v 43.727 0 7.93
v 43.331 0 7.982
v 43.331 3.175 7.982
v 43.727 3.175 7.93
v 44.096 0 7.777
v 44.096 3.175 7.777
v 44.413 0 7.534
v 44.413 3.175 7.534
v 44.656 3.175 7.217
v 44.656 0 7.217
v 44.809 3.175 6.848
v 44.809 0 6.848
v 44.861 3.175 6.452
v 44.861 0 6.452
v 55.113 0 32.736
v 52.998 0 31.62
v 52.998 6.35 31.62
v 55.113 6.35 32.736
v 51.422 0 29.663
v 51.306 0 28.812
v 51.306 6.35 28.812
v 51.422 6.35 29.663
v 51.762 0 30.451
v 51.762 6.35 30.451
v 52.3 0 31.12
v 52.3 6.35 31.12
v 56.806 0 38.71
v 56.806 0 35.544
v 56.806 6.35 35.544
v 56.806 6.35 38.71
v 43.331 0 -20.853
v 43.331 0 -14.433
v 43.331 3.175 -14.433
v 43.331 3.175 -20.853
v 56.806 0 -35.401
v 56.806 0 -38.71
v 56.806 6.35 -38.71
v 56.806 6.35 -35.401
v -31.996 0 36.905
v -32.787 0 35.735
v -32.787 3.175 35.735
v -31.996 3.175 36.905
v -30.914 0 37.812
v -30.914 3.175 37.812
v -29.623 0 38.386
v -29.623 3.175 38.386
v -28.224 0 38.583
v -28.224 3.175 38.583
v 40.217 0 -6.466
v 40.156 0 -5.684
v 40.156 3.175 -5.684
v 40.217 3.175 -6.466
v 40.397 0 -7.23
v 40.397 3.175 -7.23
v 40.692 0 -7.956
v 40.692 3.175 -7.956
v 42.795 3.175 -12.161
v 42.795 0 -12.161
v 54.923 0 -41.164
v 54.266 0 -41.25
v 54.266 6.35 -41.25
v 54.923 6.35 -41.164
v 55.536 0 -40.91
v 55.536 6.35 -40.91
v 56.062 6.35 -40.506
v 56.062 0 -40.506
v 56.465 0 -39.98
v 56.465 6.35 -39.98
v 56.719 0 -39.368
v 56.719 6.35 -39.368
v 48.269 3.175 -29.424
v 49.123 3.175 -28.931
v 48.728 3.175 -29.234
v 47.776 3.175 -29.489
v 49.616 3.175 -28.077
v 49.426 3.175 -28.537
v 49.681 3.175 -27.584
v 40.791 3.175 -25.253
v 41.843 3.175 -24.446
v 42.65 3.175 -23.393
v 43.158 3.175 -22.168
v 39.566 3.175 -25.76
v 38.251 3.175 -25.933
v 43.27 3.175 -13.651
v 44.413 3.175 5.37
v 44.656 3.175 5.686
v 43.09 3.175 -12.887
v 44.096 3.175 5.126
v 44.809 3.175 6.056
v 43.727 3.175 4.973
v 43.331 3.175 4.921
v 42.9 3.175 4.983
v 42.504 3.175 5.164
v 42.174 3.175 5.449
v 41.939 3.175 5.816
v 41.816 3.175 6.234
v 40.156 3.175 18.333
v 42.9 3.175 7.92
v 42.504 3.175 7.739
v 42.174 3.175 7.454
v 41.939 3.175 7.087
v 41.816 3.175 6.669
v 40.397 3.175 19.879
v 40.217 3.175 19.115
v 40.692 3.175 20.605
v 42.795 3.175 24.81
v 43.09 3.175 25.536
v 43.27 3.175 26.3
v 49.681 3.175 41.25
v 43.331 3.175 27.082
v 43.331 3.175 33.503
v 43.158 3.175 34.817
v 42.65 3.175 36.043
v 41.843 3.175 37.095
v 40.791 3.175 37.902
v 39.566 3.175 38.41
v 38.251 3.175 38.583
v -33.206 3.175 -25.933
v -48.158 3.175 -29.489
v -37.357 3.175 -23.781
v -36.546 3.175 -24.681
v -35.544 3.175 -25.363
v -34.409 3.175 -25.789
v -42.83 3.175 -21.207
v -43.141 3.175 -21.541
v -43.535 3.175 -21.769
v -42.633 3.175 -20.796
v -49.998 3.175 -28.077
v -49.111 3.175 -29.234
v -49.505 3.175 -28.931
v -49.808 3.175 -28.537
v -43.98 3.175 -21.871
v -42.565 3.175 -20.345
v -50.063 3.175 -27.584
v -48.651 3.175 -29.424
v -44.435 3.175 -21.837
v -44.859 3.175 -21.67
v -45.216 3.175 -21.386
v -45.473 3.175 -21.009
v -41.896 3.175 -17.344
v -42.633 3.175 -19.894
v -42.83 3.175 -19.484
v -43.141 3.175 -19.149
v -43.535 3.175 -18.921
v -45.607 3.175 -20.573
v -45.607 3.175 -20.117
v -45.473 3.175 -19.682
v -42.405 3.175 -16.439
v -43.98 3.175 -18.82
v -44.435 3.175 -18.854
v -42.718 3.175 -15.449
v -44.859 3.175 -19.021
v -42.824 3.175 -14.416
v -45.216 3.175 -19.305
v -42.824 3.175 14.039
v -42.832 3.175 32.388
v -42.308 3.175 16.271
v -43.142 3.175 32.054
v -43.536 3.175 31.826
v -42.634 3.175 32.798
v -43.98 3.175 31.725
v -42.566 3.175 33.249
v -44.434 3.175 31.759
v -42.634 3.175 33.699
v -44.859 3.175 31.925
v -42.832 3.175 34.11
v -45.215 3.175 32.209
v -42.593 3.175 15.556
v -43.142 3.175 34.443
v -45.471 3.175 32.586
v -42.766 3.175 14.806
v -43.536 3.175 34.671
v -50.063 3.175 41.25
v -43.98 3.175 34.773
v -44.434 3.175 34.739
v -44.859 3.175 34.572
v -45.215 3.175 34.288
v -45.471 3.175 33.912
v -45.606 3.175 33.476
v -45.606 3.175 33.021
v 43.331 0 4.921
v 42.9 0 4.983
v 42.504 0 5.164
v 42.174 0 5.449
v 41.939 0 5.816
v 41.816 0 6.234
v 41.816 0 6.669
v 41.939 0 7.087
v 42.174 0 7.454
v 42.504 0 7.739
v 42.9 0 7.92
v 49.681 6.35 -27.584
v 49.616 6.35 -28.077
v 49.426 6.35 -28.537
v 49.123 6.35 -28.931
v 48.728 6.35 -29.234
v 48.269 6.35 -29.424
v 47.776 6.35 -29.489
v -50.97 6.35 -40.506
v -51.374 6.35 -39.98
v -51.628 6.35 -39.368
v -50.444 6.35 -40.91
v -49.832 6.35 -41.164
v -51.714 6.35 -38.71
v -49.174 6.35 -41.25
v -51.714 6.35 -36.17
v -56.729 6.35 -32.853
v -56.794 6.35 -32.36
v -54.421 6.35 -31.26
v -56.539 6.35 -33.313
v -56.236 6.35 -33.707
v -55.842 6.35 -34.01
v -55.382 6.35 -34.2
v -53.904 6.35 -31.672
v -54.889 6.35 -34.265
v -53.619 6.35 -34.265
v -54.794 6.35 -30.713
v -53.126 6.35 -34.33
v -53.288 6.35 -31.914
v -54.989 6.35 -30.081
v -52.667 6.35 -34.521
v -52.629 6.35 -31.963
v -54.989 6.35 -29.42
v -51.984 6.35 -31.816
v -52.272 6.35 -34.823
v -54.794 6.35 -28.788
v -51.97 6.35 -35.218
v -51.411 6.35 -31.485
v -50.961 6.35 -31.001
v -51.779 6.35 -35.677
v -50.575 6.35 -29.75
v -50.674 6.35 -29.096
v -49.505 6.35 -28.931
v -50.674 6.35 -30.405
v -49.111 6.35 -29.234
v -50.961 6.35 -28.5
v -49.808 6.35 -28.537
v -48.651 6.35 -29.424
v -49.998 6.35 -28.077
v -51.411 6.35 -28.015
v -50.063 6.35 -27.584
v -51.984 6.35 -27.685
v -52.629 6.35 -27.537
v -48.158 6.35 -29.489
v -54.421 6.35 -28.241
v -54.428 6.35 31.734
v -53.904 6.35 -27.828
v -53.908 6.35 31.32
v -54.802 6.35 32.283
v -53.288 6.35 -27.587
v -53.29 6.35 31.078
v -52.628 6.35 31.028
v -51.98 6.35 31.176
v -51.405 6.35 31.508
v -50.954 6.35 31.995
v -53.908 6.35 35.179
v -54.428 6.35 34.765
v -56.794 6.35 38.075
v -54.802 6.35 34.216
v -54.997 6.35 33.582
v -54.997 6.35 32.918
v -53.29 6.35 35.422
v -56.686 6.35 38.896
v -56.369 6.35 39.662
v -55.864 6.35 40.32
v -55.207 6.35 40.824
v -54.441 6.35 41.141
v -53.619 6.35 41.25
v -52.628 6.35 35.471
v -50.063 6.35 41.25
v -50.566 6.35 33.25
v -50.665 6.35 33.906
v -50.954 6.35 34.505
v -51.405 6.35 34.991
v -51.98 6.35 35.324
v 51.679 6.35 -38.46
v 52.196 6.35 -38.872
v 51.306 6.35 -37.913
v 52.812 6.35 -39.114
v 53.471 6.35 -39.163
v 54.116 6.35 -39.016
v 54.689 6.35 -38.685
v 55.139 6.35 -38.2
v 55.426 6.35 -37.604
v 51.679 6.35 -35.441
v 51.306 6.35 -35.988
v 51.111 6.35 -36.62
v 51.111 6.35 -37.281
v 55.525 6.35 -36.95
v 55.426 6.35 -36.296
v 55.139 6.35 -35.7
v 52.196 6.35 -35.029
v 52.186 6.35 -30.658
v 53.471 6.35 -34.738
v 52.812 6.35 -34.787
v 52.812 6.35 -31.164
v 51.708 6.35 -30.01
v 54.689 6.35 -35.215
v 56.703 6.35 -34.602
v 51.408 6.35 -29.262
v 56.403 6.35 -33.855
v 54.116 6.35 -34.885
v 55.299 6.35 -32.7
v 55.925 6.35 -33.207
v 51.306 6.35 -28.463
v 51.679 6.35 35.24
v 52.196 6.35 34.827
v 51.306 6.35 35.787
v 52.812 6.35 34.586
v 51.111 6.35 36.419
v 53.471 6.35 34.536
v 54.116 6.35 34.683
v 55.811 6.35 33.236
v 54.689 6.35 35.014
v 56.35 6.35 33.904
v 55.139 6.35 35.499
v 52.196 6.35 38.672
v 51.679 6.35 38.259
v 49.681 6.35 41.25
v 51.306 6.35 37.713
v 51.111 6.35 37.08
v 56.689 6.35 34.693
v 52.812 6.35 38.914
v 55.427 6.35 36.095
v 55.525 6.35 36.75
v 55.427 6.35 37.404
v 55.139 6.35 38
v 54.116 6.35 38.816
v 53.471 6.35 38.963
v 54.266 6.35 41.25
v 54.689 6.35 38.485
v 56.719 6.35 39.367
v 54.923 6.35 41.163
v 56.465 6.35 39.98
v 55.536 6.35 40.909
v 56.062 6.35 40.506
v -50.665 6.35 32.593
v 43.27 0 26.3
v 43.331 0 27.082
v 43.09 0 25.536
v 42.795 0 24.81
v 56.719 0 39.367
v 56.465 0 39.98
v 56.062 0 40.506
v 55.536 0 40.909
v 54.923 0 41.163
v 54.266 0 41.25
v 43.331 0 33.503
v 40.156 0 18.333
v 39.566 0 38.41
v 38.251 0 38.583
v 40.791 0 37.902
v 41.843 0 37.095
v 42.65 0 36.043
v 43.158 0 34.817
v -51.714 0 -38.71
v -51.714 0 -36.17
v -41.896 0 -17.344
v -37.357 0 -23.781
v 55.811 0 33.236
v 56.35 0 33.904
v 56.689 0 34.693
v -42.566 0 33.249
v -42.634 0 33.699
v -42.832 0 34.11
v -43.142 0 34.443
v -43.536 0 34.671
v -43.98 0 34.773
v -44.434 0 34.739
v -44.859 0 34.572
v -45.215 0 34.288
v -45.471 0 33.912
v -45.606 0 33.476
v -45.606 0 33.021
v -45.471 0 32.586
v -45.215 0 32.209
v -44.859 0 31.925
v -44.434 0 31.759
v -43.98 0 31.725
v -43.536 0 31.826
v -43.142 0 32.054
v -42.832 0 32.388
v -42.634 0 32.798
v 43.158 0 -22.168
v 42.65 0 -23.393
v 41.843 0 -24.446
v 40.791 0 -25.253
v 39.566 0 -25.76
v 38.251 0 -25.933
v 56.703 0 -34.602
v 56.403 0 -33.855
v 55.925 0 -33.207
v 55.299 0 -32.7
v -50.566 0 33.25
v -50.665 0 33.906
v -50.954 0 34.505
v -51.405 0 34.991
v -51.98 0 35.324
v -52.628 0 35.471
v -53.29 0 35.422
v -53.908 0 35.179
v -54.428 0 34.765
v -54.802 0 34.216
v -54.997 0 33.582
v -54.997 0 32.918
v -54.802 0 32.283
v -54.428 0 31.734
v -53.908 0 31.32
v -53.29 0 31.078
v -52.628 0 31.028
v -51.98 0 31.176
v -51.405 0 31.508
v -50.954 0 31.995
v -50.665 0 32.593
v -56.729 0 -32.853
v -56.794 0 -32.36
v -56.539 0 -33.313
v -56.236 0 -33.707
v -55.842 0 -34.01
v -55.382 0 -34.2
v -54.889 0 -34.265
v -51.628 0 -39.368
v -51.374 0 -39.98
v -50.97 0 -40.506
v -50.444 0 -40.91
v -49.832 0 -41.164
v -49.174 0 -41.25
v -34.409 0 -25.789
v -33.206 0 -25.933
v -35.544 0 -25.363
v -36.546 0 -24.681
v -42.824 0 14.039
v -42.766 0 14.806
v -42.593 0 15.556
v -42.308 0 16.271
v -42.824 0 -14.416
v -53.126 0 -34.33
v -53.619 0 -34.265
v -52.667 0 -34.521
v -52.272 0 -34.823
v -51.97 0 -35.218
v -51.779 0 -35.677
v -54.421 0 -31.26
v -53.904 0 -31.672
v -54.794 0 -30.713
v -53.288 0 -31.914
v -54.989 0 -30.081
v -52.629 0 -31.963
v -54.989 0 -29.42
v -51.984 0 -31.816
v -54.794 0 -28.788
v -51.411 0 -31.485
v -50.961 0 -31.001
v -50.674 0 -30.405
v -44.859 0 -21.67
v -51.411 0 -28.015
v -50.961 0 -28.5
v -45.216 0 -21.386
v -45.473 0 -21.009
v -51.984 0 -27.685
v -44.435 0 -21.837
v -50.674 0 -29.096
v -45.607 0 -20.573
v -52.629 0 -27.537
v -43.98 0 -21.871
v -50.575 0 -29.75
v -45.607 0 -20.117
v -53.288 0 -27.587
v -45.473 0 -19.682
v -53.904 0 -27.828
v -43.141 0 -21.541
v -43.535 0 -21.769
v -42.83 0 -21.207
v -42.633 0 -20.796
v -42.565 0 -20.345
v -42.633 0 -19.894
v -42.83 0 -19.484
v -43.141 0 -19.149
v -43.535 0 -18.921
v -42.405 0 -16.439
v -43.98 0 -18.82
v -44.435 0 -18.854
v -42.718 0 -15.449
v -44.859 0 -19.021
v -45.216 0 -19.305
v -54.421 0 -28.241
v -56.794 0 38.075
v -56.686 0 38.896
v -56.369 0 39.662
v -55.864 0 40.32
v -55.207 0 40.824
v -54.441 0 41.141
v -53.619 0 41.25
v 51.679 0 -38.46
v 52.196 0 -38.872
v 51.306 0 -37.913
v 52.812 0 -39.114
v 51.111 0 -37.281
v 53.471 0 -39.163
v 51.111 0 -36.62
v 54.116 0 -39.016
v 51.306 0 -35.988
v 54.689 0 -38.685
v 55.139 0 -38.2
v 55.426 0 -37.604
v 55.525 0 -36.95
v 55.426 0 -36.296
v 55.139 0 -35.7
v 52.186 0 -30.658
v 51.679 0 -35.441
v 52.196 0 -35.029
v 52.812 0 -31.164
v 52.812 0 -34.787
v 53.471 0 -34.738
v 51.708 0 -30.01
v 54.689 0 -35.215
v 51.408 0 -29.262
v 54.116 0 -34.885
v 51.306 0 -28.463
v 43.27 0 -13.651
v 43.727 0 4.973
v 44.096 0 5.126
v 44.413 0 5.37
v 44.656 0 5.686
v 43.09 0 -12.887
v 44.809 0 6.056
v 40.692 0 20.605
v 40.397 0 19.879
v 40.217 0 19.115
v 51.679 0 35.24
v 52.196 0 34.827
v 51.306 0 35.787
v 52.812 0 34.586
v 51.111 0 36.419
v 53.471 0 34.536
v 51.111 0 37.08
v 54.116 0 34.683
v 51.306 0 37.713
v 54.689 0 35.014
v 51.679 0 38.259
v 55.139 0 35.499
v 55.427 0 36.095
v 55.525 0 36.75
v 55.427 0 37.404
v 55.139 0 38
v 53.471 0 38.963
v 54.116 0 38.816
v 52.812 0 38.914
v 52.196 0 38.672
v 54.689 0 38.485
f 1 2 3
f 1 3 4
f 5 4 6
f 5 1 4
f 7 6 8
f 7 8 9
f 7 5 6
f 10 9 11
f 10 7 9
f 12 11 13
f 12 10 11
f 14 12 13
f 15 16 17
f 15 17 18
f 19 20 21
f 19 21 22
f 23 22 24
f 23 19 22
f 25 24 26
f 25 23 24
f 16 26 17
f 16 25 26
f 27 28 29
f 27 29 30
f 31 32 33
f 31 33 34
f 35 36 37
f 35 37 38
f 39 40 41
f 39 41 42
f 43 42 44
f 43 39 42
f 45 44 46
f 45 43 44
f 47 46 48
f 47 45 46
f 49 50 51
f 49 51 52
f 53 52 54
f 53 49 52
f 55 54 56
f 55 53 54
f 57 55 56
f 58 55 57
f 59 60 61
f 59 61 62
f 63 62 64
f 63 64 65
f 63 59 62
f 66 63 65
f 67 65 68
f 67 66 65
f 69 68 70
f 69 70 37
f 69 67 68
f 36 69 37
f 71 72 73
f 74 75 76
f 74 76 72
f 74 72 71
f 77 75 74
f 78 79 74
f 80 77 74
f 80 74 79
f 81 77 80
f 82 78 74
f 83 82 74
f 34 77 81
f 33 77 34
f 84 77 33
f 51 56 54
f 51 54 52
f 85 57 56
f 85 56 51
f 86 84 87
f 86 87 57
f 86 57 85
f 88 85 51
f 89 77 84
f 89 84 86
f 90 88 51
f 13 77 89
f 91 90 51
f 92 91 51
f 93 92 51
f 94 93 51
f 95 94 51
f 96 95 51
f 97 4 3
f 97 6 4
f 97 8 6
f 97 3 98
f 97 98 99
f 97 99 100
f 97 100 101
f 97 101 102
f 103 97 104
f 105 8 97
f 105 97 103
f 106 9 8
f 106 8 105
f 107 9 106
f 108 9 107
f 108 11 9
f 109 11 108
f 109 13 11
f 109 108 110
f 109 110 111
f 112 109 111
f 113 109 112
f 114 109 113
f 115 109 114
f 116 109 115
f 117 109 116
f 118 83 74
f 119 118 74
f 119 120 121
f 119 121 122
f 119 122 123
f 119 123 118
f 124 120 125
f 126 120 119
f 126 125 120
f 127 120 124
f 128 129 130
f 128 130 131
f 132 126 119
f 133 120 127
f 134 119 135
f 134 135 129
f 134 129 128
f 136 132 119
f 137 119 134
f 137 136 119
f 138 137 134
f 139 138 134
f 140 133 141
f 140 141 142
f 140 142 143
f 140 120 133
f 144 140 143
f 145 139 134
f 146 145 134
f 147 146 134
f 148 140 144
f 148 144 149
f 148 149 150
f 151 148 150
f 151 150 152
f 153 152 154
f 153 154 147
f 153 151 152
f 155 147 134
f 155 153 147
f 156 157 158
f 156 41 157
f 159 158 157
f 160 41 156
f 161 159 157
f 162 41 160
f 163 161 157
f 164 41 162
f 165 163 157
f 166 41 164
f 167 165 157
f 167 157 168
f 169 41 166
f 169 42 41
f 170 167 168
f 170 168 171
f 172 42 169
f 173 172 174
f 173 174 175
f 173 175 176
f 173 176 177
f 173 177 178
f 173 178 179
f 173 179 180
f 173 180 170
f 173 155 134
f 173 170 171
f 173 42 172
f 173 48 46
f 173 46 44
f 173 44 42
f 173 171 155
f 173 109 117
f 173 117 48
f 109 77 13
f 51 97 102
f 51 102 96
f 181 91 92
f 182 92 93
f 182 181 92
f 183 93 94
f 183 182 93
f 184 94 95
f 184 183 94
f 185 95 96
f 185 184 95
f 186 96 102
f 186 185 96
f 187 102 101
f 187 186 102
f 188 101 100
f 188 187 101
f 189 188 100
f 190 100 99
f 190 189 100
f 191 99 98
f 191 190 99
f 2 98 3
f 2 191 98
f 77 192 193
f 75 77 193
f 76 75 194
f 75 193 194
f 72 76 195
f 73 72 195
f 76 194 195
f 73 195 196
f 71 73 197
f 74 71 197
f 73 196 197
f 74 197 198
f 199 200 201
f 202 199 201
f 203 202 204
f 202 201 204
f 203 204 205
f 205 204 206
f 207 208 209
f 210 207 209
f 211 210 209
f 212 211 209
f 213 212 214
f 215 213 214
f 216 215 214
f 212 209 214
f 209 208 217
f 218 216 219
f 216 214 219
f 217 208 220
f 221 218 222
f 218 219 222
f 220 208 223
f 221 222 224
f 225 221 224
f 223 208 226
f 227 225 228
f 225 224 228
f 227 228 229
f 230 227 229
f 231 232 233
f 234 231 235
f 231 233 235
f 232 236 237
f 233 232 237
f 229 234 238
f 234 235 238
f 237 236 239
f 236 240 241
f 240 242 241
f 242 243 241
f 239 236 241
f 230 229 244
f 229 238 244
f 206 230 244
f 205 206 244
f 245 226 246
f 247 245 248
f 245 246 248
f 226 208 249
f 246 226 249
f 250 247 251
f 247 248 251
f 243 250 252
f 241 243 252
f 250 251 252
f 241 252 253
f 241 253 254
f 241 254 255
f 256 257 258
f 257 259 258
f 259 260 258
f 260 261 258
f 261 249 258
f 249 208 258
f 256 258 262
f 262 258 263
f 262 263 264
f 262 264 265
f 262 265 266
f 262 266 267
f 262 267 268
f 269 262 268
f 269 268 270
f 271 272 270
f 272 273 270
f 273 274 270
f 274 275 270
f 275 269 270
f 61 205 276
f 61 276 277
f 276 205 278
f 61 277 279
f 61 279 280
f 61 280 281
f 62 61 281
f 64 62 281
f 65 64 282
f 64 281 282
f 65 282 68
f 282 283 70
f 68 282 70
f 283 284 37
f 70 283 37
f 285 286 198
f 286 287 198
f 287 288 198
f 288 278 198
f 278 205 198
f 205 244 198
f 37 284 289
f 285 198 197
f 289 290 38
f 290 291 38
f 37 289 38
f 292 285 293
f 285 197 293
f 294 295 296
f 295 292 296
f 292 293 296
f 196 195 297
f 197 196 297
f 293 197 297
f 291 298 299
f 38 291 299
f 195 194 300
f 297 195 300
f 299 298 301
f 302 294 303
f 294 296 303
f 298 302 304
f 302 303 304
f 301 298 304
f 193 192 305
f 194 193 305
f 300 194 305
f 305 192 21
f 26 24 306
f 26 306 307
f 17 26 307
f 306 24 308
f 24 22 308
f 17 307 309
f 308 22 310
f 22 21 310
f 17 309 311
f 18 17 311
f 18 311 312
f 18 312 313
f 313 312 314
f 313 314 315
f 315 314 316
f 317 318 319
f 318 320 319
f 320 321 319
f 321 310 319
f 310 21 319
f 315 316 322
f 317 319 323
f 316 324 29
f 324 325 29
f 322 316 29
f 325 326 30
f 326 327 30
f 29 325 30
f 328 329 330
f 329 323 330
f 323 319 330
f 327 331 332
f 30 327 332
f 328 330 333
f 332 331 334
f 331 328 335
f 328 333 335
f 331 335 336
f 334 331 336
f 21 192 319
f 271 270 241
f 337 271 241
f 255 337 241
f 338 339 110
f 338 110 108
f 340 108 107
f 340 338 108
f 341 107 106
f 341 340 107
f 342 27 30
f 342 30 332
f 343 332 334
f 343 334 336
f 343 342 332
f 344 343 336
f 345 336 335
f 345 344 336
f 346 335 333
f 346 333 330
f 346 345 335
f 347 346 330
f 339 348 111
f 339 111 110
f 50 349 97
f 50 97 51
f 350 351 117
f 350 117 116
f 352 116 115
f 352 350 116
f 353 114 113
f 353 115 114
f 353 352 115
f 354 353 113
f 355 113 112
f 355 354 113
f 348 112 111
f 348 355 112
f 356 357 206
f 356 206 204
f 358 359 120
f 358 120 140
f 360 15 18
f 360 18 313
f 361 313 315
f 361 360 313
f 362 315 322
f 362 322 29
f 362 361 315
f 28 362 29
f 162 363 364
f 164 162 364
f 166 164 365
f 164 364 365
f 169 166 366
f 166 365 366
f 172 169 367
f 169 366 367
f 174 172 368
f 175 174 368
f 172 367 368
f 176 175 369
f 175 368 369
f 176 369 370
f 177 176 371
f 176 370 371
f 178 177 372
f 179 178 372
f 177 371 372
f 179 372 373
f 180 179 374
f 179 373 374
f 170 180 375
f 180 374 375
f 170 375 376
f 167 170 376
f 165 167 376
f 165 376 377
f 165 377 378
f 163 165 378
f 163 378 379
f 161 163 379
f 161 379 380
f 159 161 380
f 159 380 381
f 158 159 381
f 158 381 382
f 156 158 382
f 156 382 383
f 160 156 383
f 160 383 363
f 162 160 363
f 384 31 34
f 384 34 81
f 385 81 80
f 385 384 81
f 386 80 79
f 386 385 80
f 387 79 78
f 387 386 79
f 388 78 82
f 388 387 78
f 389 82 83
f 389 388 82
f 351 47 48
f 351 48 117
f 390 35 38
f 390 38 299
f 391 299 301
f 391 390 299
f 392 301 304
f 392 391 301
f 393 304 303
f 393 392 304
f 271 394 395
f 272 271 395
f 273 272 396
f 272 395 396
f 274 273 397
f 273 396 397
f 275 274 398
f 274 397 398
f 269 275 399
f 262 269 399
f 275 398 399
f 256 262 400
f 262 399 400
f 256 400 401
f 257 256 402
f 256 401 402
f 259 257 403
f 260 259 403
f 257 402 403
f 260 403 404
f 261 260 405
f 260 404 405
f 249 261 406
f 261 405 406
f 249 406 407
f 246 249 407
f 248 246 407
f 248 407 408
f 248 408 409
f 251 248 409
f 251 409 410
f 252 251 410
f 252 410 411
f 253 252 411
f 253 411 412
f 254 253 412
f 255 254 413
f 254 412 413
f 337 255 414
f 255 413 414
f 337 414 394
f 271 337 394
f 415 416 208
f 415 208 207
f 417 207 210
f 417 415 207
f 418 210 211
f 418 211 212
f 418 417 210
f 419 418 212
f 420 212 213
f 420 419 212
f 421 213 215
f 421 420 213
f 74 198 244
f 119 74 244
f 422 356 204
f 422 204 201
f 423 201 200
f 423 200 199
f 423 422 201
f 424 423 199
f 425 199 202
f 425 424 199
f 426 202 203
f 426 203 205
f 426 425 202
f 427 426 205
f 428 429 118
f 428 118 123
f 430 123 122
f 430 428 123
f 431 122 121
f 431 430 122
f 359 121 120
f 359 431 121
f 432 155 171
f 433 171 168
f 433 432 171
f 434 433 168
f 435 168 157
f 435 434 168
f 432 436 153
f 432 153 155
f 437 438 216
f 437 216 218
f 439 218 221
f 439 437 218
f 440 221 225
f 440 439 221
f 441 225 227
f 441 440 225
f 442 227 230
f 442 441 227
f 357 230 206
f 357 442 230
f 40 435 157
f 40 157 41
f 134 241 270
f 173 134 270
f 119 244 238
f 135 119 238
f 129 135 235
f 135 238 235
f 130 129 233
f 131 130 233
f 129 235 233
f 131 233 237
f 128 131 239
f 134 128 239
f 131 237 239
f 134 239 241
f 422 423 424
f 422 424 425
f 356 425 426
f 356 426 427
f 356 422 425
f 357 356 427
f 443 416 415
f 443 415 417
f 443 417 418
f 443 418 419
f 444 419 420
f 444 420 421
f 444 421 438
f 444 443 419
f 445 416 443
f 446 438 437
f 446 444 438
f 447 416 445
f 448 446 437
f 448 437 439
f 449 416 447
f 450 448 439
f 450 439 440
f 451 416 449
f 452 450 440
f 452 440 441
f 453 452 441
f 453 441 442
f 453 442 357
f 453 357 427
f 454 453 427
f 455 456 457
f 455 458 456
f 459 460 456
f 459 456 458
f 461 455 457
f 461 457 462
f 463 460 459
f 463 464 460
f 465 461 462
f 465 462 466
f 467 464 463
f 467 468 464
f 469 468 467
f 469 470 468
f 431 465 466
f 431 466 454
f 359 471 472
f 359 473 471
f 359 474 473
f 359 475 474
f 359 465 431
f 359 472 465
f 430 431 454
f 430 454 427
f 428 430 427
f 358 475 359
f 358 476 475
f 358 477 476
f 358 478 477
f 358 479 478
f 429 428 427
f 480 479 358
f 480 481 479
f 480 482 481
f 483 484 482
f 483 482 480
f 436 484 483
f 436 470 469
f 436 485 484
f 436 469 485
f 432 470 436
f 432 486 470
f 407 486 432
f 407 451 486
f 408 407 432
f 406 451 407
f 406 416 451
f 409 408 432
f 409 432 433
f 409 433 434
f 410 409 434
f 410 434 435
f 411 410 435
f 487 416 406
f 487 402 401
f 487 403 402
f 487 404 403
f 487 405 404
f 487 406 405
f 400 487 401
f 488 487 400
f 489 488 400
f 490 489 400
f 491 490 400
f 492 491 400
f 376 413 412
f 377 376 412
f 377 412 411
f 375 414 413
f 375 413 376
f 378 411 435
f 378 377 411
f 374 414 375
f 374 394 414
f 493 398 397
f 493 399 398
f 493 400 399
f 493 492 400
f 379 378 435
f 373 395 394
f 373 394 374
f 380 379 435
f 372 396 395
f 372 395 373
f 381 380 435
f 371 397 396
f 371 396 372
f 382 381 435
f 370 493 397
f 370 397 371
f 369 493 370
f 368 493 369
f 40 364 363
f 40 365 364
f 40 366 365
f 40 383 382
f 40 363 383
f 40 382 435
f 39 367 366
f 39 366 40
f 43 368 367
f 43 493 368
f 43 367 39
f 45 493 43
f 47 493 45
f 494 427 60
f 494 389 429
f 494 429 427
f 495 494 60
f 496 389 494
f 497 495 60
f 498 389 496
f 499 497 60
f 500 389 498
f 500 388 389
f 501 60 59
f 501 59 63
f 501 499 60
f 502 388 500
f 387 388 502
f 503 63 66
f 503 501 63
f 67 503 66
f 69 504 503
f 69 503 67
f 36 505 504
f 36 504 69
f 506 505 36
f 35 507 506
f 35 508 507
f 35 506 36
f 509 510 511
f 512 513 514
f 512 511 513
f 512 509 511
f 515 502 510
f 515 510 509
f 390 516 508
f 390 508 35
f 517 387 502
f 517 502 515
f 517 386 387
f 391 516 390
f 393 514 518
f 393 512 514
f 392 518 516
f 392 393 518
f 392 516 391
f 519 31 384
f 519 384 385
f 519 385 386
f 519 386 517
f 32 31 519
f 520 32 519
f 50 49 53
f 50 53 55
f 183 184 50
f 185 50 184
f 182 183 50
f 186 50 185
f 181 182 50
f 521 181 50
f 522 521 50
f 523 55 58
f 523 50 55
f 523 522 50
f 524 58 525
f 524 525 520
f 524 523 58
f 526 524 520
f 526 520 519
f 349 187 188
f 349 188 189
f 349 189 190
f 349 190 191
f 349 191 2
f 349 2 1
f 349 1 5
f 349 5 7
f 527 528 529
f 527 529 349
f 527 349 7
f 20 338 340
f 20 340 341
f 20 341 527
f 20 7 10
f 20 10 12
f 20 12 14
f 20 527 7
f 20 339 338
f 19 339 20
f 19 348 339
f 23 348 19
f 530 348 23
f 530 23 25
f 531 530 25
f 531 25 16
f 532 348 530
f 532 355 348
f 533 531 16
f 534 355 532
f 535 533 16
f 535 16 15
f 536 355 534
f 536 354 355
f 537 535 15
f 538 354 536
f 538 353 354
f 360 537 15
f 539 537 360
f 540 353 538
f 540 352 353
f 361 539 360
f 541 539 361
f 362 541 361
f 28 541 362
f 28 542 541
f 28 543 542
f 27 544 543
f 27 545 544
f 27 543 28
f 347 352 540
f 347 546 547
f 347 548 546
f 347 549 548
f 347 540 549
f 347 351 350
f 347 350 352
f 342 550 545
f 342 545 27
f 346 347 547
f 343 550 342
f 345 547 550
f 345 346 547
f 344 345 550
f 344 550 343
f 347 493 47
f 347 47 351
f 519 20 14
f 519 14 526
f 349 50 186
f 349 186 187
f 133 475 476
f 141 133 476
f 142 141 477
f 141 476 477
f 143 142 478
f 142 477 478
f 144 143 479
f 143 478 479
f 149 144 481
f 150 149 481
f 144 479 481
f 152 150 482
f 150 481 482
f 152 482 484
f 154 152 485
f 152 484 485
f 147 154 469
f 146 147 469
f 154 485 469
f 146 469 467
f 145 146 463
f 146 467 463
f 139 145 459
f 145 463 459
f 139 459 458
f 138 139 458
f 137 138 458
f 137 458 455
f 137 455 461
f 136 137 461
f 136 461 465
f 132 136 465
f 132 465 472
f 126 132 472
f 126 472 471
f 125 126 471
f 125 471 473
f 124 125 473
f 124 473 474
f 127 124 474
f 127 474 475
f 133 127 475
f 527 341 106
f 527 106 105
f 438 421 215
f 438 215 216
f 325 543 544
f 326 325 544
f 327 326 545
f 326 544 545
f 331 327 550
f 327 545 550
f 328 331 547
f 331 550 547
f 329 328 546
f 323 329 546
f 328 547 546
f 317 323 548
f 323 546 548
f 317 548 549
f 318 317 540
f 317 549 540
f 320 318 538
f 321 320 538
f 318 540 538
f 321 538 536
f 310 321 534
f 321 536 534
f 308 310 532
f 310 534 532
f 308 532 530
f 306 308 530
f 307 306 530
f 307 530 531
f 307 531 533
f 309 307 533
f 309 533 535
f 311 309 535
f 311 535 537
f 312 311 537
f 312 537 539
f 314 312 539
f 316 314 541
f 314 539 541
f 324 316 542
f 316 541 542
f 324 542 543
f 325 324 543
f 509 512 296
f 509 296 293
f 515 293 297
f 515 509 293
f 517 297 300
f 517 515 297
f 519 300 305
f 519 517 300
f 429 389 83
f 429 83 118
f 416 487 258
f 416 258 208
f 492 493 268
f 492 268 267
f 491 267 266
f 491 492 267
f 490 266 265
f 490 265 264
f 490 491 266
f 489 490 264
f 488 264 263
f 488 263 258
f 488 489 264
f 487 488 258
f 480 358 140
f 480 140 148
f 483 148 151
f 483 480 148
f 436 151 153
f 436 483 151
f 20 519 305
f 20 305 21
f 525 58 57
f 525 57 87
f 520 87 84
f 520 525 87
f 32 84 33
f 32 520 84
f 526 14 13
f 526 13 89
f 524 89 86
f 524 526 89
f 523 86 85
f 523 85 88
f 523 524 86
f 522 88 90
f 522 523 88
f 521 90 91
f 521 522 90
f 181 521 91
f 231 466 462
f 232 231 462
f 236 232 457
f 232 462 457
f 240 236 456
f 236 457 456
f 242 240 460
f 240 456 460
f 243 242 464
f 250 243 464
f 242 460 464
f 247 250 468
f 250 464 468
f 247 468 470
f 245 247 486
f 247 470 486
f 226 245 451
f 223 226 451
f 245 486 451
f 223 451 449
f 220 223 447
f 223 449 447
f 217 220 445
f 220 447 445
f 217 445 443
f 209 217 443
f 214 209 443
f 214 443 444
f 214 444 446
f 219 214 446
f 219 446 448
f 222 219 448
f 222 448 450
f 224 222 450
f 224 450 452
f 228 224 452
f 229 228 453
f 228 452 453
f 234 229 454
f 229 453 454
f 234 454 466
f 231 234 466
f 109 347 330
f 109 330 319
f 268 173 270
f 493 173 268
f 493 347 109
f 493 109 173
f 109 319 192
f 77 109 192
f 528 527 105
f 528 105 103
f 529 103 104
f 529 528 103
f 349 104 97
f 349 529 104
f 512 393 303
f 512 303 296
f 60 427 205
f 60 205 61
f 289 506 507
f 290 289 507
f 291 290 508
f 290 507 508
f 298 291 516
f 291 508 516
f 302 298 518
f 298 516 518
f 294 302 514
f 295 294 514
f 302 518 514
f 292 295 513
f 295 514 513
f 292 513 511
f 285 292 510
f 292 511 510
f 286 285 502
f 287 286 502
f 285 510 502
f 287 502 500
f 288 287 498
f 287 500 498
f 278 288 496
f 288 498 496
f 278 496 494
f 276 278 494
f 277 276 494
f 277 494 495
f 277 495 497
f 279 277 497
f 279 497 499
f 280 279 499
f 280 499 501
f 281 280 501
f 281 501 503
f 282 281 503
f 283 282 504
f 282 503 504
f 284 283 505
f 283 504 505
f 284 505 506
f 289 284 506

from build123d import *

# Parameters (mm, degrees)
F0_R     = 2.219223
F0_R_2   = 1.529807
F0_R_3   = 2.219078
F0_R_4   = 2.227919
F0_R_5   = 1.528278
F0_R_6   = 2.219557
F1_DEPTH = 6.35
F2_R     = 1.529807
F2_R_2   = 1.530286
F2_R_3   = 1.528278
F3_DEPTH = 3.175


with BuildPart() as f1:
    # F0 (on Front) → F1 (new body)
    with BuildSketch(Plane.XZ):
        with BuildLine():
            Line((54.2656, 41.2496), (-53.6194, 41.2496))
            ThreePointArc((-53.6194, 41.2496), (-55.864464, 40.319664), (-56.7944, 38.0746))
            Line((-56.7944, 38.0746), (-56.7944, -32.3604))
            ThreePointArc((-56.7944, -32.3604), (-56.236438, -33.707438), (-54.8894, -34.2654))
            Line((-54.8894, -34.2654), (-53.6194, -34.2654))
            ThreePointArc((-53.6194, -34.2654), (-52.272362, -34.823362), (-51.7144, -36.1704))
            Line((-51.7144, -36.1704), (-51.7144, -38.7104))
            ThreePointArc((-51.7144, -38.7104), (-50.970451, -40.506451), (-49.1744, -41.2504))
            Line((-49.1744, -41.2504), (54.2656, -41.2504))
            ThreePointArc((54.2656, -41.2504), (56.061651, -40.506451), (56.8056, -38.7104))
            Line((56.8056, -38.7104), (56.8056, -35.401342))
            ThreePointArc((56.8056, -35.401342), (56.40343, -33.854721), (55.298806, -32.699913))
            Line((55.298806, -32.699913), (52.812394, -31.164487))
            ThreePointArc((52.812394, -31.164487), (51.70777, -30.009679), (51.3056, -28.463058))
            Line((51.3056, -28.463058), (51.3056, 28.811881))
            ThreePointArc((51.3056, 28.811881), (51.761511, 30.451144), (52.998313, 31.619629))
            Line((52.998313, 31.619629), (55.112887, 32.735971))
            ThreePointArc((55.112887, 32.735971), (56.349689, 33.904456), (56.8056, 35.543719))
            Line((56.8056, 35.543719), (56.8056, 38.7096))
            ThreePointArc((56.8056, 38.7096), (56.061651, 40.505651), (54.2656, 41.2496))
        make_face()
        with Locations((-52.7944, -29.7504)):
            Circle(F0_R, mode=Mode.SUBTRACT)
        with Locations((-44.0944, -20.3454)):
            Circle(F0_R_2, mode=Mode.SUBTRACT)
        with Locations((53.3056, -36.9504)):
            Circle(F0_R_3, mode=Mode.SUBTRACT)
        with Locations((-52.7944, 33.2496)):
            Circle(F0_R_4, mode=Mode.SUBTRACT)
        with Locations((-44.0944, 33.2486)):
            Circle(F0_R_5, mode=Mode.SUBTRACT)
        with BuildLine():
            ThreePointArc((43.330965, -20.8534), (41.843067, -24.445502), (38.250965, -25.9334))
            Line((38.250965, -25.9334), (-33.205545, -25.9334))
            ThreePointArc((-33.205545, -25.9334), (-35.543803, -25.363272), (-37.357216, -23.780861))
            Line((-37.357216, -23.780861), (-41.896071, -17.343939))
            ThreePointArc((-41.896071, -17.343939), (-42.586759, -15.952042), (-42.8244, -14.416478))
            Line((-42.8244, -14.416478), (-42.8244, 14.03877))
            ThreePointArc((-42.8244, 14.03877), (-42.693554, 15.184314), (-42.307758, 16.270847))
            Line((-42.307758, 16.270847), (-32.787406, 35.734677))
            ThreePointArc((-32.787406, 35.734677), (-30.913607, 37.812203), (-28.224048, 38.5826))
            Line((-28.224048, 38.5826), (38.250965, 38.5826))
            ThreePointArc((38.250965, 38.5826), (41.843067, 37.094702), (43.330965, 33.5026))
            Line((43.330965, 33.5026), (43.330965, 27.081825))
            ThreePointArc((43.330965, 27.081825), (43.19507, 25.91468), (42.794655, 24.80998))
            Line((42.794655, 24.80998), (40.692275, 20.60522))
            ThreePointArc((40.692275, 20.60522), (40.29186, 19.50052), (40.155965, 18.333375))
            Line((40.155965, 18.333375), (40.155965, -5.684175))
            ThreePointArc((40.155965, -5.684175), (40.29186, -6.85132), (40.692275, -7.95602))
            Line((40.692275, -7.95602), (42.794655, -12.16078))
            ThreePointArc((42.794655, -12.16078), (43.19507, -13.26548), (43.330965, -14.432625))
            Line((43.330965, -14.432625), (43.330965, -20.8534))
        make_face(mode=Mode.SUBTRACT)
        with BuildLine():
            ThreePointArc((43.330965, 7.981886), (44.413041, 7.533676), (44.861251, 6.4516))
            ThreePointArc((44.861251, 6.4516), (44.413041, 5.369524), (43.330965, 4.921314))
            ThreePointArc((43.330965, 4.921314), (41.800678, 6.4516), (43.330965, 7.981886))
        make_face(mode=Mode.SUBTRACT)
        with Locations((53.3056, 36.7496)):
            Circle(F0_R_6, mode=Mode.SUBTRACT)
    extrude(amount=-F1_DEPTH)

    # F2 (on face) → F3 (cut)
    with BuildSketch(Plane(origin=(0, 6.35, 0), x_dir=(-1, 0, 0), z_dir=(0, 1, 0))):
        with BuildLine():
            Line((-47.775965, -29.4894), (48.1584, -29.4894))
            ThreePointArc((48.1584, -29.4894), (49.505438, -28.931438), (50.0634, -27.5844))
            Line((50.0634, -27.5844), (50.0634, 41.2496))
            Line((50.0634, 41.2496), (-49.680965, 41.2496))
            Line((-49.680965, 41.2496), (-49.680965, -27.5844))
            ThreePointArc((-49.680965, -27.5844), (-49.123003, -28.931438), (-47.775965, -29.4894))
        make_face()
        with Locations((44.0944, -20.3454)):
            Circle(F2_R, mode=Mode.SUBTRACT)
        with Locations((-43.330965, 6.4516)):
            Circle(F2_R_2, mode=Mode.SUBTRACT)
        with BuildLine():
            ThreePointArc((-40.692275, -7.95602), (-40.29186, -6.85132), (-40.155965, -5.684175))
            Line((-40.155965, -5.684175), (-40.155965, 18.333375))
            ThreePointArc((-40.155965, 18.333375), (-40.29186, 19.50052), (-40.692275, 20.60522))
            Line((-40.692275, 20.60522), (-42.794655, 24.80998))
            ThreePointArc((-42.794655, 24.80998), (-43.19507, 25.91468), (-43.330965, 27.081825))
            Line((-43.330965, 27.081825), (-43.330965, 33.5026))
            ThreePointArc((-43.330965, 33.5026), (-41.843067, 37.094702), (-38.250965, 38.5826))
            Line((-38.250965, 38.5826), (28.224048, 38.5826))
            ThreePointArc((28.224048, 38.5826), (30.913607, 37.812203), (32.787406, 35.734677))
            Line((32.787406, 35.734677), (42.307758, 16.270847))
            ThreePointArc((42.307758, 16.270847), (42.693554, 15.184314), (42.8244, 14.03877))
            Line((42.8244, 14.03877), (42.8244, -14.416478))
            ThreePointArc((42.8244, -14.416478), (42.586759, -15.952042), (41.896071, -17.343939))
            Line((41.896071, -17.343939), (37.357216, -23.780861))
            ThreePointArc((37.357216, -23.780861), (35.543803, -25.363272), (33.205545, -25.9334))
            Line((33.205545, -25.9334), (-38.250965, -25.9334))
            ThreePointArc((-38.250965, -25.9334), (-41.843067, -24.445502), (-43.330965, -20.8534))
            Line((-43.330965, -20.8534), (-43.330965, -14.432625))
            ThreePointArc((-43.330965, -14.432625), (-43.19507, -13.26548), (-42.794655, -12.16078))
            Line((-42.794655, -12.16078), (-40.692275, -7.95602))
        make_face(mode=Mode.SUBTRACT)
        with Locations((44.0944, 33.2486)):
            Circle(F2_R_3, mode=Mode.SUBTRACT)
    extrude(amount=-F3_DEPTH, mode=Mode.SUBTRACT)


solid = f1.part
